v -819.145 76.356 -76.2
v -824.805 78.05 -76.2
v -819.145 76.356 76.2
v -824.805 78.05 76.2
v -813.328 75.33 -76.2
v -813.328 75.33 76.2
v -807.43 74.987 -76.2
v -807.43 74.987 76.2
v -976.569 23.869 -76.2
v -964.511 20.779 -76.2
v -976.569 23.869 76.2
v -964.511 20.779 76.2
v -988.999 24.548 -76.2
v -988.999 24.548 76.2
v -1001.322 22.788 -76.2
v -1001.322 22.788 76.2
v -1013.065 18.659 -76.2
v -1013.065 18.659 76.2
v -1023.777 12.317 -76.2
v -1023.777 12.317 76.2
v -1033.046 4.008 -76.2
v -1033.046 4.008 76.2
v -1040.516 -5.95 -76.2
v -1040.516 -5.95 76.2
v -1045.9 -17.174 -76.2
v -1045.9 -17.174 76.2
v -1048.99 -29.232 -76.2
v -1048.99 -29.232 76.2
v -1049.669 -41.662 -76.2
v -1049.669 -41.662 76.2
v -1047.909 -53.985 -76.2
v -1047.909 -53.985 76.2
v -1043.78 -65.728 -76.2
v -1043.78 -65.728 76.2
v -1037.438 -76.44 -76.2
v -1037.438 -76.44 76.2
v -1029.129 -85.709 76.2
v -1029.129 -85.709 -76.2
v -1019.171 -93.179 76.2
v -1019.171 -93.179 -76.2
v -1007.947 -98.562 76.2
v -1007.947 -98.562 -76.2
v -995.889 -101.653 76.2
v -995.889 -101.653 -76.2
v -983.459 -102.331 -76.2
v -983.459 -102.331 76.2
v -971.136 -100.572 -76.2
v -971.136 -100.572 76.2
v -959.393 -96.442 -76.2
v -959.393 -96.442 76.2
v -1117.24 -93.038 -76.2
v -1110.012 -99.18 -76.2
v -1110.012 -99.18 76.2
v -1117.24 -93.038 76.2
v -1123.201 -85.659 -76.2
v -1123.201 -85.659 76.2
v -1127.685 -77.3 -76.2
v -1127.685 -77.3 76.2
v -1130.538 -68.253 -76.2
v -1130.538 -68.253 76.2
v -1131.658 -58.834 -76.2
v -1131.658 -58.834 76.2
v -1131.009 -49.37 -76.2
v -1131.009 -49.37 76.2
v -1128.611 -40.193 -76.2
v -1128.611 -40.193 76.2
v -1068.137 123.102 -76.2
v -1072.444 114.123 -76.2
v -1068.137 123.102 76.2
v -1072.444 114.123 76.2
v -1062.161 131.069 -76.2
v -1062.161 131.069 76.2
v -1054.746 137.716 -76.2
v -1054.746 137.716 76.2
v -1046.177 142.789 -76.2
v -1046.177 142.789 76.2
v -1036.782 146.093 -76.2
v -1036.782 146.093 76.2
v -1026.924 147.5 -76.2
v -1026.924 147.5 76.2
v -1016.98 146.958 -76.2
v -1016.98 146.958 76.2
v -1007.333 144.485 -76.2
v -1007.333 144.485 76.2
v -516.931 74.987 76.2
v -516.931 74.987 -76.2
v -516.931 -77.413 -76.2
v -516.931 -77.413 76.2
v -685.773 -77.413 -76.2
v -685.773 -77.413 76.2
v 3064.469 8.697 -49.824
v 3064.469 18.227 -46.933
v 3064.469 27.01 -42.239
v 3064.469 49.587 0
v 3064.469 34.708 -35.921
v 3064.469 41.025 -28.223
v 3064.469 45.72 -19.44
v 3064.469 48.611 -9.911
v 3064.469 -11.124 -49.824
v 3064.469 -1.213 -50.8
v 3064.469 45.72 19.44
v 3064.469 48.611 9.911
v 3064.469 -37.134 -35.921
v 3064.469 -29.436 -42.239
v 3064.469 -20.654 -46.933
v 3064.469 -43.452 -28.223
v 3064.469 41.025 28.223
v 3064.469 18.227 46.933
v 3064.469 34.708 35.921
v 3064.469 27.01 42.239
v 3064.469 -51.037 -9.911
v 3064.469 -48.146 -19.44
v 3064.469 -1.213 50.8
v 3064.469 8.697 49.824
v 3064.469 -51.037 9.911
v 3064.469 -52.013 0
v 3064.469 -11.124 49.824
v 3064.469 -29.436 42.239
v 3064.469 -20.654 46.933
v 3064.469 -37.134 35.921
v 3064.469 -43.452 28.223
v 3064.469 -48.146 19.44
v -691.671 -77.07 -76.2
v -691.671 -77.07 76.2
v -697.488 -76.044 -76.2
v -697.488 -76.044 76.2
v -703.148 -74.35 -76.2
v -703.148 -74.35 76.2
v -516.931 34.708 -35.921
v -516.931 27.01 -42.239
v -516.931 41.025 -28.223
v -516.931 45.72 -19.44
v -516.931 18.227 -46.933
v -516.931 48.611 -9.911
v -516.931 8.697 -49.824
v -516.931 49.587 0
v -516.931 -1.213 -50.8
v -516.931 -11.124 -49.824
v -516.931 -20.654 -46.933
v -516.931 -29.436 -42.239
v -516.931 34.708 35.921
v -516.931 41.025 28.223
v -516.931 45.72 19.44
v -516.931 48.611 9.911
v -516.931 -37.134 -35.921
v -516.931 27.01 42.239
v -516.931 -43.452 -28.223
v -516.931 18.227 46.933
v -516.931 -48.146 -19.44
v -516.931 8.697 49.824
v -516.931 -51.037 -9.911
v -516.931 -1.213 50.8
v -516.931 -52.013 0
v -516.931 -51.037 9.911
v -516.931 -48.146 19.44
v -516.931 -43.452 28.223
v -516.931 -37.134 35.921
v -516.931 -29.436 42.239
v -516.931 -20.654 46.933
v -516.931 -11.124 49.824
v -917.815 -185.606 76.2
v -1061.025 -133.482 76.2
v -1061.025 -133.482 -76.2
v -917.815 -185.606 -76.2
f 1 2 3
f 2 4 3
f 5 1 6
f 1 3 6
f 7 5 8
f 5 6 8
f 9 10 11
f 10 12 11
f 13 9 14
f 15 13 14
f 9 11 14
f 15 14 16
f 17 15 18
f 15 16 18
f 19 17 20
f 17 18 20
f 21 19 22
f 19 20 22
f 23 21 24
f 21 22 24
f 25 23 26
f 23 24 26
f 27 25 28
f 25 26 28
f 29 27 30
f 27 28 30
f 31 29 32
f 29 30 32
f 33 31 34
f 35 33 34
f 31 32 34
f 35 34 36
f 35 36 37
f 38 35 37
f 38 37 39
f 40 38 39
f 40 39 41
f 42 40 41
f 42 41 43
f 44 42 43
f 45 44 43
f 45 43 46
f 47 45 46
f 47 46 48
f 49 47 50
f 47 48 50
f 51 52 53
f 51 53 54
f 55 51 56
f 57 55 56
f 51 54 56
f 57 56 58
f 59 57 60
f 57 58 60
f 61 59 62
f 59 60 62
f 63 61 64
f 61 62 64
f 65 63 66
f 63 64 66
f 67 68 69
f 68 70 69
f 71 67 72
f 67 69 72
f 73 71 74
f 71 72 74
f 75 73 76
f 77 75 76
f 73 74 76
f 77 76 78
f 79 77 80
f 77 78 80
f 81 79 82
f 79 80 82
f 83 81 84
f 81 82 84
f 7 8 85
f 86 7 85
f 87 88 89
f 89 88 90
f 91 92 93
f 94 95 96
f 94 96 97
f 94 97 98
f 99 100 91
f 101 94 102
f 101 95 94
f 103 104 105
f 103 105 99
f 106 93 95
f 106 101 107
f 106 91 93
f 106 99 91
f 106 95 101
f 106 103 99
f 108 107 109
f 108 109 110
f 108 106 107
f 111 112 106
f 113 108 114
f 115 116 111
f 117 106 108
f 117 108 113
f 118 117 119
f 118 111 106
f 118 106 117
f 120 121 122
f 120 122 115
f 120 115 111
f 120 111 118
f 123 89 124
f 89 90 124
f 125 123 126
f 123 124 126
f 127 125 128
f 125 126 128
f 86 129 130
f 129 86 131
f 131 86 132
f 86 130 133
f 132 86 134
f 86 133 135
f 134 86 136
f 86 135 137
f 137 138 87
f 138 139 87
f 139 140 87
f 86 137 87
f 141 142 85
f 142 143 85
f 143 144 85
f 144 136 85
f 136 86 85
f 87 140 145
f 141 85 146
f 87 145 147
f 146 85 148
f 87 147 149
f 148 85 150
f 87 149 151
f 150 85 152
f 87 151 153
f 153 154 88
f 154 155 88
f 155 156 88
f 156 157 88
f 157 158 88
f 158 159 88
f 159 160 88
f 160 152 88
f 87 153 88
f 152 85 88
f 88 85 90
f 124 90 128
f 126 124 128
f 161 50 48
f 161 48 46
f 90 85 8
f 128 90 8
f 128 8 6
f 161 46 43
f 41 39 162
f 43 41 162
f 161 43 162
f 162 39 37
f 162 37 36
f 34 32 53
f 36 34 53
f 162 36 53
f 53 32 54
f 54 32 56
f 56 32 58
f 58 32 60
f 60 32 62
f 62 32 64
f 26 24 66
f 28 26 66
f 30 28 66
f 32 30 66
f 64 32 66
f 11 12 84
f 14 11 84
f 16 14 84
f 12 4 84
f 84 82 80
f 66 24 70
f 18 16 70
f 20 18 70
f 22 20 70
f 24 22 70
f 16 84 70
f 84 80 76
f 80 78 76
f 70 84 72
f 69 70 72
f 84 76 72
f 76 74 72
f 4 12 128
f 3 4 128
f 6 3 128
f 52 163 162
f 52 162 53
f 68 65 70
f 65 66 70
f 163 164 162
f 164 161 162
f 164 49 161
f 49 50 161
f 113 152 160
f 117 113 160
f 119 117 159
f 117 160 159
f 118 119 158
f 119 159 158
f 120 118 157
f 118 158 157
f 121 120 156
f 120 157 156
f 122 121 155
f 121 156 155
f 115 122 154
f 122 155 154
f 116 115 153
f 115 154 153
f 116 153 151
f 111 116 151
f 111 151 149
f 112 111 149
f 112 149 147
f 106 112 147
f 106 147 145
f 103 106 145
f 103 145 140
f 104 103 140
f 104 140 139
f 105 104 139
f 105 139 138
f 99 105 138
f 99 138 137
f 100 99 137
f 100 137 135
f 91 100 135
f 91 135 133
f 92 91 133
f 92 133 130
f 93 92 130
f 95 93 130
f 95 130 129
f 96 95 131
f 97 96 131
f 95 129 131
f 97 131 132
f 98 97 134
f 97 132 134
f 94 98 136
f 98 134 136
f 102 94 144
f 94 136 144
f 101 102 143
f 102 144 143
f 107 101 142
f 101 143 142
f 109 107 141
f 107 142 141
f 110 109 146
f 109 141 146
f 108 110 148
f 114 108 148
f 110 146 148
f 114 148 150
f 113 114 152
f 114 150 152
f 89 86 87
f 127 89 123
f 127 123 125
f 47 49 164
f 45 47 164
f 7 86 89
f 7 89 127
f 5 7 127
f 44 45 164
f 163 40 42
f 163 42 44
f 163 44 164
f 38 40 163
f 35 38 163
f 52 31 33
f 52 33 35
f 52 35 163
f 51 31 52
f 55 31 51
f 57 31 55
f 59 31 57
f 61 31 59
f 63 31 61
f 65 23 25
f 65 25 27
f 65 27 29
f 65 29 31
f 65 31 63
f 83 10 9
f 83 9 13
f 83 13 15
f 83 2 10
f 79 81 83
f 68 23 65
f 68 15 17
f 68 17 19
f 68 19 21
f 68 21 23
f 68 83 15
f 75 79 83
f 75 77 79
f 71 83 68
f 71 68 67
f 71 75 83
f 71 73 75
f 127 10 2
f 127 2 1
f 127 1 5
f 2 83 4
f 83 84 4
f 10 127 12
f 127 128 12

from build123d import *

# Parameters (mm, degrees)
SKETCH1_R           = 25.4
BOSS_EXTRUDE1_DEPTH = 1828.8
BOSS_EXTRUDE2_DEPTH = 38.1
SCALE1_SCALE        = 2


with BuildPart() as part:
    # Sketch1 → Boss-Extrude1 (new body)
    with BuildSketch(Plane(origin=(0, 0, 0), x_dir=(0, 0, -1), z_dir=(1, 0, 0))):
        with Locations(Location((0, 0, 0), (0, 0, 180))):
            Circle(SKETCH1_R)
    extrude(amount=BOSS_EXTRUDE1_DEPTH)

    # Sketch2 → Boss-Extrude2 (add, symmetric)
    with BuildSketch(Plane.XY):
        with BuildLine():
            Line((38.1, -38.1), (-46.32129469, -38.1))
            ThreePointArc((-46.32129469, -38.1), (-50.731958403, -37.714116927), (-55.00860633, -36.568192568))
            Line((-55.00860633, -36.568192568), (-185.690096464, 10.99598001))
            ThreePointArc((-185.690096464, 10.99598001), (-228.26901705, -20.224176249), (-183.131106204, -47.614532938))
            Line((-183.131106204, -47.614532938), (-162.342385793, -92.196087728))
            Line((-162.342385793, -92.196087728), (-233.946963497, -66.134152806))
            Line((-233.946963497, -66.134152806), (-258.440677117, -48.983469891))
            ThreePointArc((-258.440677117, -48.983469891), (-268.096246183, -35.814935274), (-267.740028202, -19.489696326))
            Line((-267.740028202, -19.489696326), (-239.656790314, 57.668365634))
            ThreePointArc((-239.656790314, 57.668365634), (-226.523101595, 72.001271785), (-207.101286106, 72.849246562))
            Line((-207.101286106, 72.849246562), (-115.837122165, 39.631807432))
            ThreePointArc((-115.837122165, 39.631807432), (-111.560474237, 38.485883073), (-107.149810524, 38.1))
            Line((-107.149810524, 38.1), (38.1, 38.1))
            Line((38.1, 38.1), (38.1, -38.1))
        make_face()
    extrude(amount=BOSS_EXTRUDE2_DEPTH, both=True)


with BuildPart() as part_1:
    # Scale1: scaled about (593.130591899, 1.21334117, 0)
    add(part.part.scale(SCALE1_SCALE).moved(Location((-593.130591899, -1.21334117, 0))))


solid = part_1.part
